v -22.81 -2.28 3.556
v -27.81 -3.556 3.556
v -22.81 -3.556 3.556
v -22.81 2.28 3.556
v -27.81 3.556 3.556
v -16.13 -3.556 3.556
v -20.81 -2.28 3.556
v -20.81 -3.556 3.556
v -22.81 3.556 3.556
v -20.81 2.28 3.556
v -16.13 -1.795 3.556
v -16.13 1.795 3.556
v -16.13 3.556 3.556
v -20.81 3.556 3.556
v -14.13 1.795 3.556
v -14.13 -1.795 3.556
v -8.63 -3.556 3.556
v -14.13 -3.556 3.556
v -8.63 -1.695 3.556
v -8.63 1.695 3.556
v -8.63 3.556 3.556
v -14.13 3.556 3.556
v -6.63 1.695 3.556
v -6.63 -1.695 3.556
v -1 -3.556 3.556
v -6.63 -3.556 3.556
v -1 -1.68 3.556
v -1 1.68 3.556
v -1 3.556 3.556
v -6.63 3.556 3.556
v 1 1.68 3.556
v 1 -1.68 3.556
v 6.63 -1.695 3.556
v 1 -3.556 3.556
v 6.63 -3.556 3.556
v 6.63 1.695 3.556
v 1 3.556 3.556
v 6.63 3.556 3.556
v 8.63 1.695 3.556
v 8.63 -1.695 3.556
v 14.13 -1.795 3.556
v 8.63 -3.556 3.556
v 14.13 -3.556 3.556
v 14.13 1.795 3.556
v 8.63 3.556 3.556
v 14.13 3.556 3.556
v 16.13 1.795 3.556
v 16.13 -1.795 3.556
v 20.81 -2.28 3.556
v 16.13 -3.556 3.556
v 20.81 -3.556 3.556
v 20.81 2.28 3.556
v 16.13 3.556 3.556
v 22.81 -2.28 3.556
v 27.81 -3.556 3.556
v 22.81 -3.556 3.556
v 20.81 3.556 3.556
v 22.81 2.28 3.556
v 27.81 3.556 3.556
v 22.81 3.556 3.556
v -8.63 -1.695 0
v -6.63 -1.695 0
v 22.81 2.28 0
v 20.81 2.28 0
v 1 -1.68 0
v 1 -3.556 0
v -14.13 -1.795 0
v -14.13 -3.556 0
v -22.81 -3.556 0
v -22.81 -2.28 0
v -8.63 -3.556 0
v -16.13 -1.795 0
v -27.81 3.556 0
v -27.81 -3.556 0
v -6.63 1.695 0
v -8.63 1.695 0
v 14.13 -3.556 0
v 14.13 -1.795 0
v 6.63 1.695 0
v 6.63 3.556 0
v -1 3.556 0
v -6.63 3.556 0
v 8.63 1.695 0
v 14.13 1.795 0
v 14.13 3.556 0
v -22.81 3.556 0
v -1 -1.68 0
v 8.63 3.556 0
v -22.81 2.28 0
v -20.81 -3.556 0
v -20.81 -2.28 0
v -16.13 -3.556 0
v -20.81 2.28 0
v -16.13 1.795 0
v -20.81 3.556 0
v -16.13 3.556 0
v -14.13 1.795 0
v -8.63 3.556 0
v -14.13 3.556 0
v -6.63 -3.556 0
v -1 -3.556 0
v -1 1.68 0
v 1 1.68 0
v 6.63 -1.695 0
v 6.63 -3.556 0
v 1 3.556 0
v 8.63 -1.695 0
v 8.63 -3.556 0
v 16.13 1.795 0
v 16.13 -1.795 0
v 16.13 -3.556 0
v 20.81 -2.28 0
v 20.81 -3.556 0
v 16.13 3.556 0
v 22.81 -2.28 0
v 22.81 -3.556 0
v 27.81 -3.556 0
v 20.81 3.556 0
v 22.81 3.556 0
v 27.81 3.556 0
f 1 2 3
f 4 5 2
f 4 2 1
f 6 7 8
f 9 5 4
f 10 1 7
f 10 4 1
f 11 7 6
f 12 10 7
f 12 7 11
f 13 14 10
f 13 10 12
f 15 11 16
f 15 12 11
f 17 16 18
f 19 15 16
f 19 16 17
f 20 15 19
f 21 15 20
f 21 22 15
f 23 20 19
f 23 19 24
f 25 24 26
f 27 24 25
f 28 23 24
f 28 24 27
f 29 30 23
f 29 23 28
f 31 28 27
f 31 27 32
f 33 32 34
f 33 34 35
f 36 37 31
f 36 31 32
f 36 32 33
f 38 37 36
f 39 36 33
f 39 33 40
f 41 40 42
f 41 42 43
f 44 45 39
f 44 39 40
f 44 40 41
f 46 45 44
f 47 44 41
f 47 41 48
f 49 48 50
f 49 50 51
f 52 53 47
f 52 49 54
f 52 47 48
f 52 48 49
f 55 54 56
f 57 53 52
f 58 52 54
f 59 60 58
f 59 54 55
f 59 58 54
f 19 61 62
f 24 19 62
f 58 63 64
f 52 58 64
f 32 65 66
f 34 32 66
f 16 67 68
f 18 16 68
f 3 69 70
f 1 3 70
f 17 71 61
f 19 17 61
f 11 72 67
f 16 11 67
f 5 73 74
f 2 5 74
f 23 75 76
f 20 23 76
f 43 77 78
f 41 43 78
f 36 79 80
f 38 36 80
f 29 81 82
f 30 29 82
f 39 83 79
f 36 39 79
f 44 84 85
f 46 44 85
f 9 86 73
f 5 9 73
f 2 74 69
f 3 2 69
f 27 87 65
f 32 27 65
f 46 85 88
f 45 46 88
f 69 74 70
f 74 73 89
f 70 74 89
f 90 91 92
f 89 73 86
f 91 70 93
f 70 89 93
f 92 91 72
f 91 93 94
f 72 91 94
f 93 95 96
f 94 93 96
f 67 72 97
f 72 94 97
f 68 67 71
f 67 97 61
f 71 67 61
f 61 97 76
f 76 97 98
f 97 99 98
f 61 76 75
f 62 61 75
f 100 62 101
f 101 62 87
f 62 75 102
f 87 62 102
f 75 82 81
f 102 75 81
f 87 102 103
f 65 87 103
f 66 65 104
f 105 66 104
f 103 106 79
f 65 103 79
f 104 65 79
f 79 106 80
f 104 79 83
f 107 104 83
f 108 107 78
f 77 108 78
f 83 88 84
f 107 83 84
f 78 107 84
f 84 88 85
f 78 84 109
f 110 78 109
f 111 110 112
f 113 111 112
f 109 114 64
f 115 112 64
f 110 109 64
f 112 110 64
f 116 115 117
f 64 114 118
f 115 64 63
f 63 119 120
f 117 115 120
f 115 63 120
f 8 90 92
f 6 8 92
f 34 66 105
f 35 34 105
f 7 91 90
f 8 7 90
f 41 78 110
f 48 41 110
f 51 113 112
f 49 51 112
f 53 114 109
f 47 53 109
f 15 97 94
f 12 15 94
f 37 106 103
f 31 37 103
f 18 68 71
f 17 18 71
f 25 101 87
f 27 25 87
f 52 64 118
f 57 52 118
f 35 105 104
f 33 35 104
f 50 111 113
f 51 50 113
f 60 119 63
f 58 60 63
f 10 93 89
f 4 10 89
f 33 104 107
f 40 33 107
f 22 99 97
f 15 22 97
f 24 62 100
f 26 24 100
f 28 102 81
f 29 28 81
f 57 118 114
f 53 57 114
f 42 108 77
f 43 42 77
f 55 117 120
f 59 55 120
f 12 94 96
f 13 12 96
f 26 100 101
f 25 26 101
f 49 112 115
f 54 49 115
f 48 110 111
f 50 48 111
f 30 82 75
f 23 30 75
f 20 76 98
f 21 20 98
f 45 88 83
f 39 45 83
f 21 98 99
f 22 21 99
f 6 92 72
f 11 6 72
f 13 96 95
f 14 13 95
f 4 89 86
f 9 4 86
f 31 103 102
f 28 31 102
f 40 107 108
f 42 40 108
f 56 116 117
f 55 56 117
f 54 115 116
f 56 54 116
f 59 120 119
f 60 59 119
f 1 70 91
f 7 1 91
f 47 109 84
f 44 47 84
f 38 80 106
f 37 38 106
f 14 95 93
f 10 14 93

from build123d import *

# Parameters (mm, degrees)
BOSS_EXTRUDE1_DEPTH = 3.556


with BuildPart() as part:
    # Sketch1 → Boss-Extrude1 (new body)
    with BuildSketch(Plane.XY):
        Polygon((27.81, -3.556), (27.81, 3.556), (22.81, 3.556), (22.81, 2.28), (20.81, 2.28), (20.81, 3.556), (16.13, 3.556), (16.13, 1.795), (14.13, 1.795), (14.13, 3.556), (8.63, 3.556), (8.63, 1.695), (6.63, 1.695), (6.63, 3.556), (1, 3.556), (1, 1.68), (-1, 1.68), (-1, 3.556), (-6.63, 3.556), (-6.63, 1.695), (-8.63, 1.695), (-8.63, 3.556), (-14.13, 3.556), (-14.13, 1.795), (-16.13, 1.795), (-16.13, 3.556), (-20.81, 3.556), (-20.81, 2.28), (-22.81, 2.28), (-22.81, 3.556), (-27.81, 3.556), (-27.81, -3.556), (-22.81, -3.556), (-22.81, -2.28), (-20.81, -2.28), (-20.81, -3.556), (-16.13, -3.556), (-16.13, -1.795), (-14.13, -1.795), (-14.13, -3.556), (-8.63, -3.556), (-8.63, -1.695), (-6.63, -1.695), (-6.63, -3.556), (-1, -3.556), (-1, -1.68), (1, -1.68), (1, -3.556), (6.63, -3.556), (6.63, -1.695), (8.63, -1.695), (8.63, -3.556), (14.13, -3.556), (14.13, -1.795), (16.13, -1.795), (16.13, -3.556), (20.81, -3.556), (20.81, -2.28), (22.81, -2.28), (22.81, -3.556), align=None)
    extrude(amount=BOSS_EXTRUDE1_DEPTH)


solid = part.part
